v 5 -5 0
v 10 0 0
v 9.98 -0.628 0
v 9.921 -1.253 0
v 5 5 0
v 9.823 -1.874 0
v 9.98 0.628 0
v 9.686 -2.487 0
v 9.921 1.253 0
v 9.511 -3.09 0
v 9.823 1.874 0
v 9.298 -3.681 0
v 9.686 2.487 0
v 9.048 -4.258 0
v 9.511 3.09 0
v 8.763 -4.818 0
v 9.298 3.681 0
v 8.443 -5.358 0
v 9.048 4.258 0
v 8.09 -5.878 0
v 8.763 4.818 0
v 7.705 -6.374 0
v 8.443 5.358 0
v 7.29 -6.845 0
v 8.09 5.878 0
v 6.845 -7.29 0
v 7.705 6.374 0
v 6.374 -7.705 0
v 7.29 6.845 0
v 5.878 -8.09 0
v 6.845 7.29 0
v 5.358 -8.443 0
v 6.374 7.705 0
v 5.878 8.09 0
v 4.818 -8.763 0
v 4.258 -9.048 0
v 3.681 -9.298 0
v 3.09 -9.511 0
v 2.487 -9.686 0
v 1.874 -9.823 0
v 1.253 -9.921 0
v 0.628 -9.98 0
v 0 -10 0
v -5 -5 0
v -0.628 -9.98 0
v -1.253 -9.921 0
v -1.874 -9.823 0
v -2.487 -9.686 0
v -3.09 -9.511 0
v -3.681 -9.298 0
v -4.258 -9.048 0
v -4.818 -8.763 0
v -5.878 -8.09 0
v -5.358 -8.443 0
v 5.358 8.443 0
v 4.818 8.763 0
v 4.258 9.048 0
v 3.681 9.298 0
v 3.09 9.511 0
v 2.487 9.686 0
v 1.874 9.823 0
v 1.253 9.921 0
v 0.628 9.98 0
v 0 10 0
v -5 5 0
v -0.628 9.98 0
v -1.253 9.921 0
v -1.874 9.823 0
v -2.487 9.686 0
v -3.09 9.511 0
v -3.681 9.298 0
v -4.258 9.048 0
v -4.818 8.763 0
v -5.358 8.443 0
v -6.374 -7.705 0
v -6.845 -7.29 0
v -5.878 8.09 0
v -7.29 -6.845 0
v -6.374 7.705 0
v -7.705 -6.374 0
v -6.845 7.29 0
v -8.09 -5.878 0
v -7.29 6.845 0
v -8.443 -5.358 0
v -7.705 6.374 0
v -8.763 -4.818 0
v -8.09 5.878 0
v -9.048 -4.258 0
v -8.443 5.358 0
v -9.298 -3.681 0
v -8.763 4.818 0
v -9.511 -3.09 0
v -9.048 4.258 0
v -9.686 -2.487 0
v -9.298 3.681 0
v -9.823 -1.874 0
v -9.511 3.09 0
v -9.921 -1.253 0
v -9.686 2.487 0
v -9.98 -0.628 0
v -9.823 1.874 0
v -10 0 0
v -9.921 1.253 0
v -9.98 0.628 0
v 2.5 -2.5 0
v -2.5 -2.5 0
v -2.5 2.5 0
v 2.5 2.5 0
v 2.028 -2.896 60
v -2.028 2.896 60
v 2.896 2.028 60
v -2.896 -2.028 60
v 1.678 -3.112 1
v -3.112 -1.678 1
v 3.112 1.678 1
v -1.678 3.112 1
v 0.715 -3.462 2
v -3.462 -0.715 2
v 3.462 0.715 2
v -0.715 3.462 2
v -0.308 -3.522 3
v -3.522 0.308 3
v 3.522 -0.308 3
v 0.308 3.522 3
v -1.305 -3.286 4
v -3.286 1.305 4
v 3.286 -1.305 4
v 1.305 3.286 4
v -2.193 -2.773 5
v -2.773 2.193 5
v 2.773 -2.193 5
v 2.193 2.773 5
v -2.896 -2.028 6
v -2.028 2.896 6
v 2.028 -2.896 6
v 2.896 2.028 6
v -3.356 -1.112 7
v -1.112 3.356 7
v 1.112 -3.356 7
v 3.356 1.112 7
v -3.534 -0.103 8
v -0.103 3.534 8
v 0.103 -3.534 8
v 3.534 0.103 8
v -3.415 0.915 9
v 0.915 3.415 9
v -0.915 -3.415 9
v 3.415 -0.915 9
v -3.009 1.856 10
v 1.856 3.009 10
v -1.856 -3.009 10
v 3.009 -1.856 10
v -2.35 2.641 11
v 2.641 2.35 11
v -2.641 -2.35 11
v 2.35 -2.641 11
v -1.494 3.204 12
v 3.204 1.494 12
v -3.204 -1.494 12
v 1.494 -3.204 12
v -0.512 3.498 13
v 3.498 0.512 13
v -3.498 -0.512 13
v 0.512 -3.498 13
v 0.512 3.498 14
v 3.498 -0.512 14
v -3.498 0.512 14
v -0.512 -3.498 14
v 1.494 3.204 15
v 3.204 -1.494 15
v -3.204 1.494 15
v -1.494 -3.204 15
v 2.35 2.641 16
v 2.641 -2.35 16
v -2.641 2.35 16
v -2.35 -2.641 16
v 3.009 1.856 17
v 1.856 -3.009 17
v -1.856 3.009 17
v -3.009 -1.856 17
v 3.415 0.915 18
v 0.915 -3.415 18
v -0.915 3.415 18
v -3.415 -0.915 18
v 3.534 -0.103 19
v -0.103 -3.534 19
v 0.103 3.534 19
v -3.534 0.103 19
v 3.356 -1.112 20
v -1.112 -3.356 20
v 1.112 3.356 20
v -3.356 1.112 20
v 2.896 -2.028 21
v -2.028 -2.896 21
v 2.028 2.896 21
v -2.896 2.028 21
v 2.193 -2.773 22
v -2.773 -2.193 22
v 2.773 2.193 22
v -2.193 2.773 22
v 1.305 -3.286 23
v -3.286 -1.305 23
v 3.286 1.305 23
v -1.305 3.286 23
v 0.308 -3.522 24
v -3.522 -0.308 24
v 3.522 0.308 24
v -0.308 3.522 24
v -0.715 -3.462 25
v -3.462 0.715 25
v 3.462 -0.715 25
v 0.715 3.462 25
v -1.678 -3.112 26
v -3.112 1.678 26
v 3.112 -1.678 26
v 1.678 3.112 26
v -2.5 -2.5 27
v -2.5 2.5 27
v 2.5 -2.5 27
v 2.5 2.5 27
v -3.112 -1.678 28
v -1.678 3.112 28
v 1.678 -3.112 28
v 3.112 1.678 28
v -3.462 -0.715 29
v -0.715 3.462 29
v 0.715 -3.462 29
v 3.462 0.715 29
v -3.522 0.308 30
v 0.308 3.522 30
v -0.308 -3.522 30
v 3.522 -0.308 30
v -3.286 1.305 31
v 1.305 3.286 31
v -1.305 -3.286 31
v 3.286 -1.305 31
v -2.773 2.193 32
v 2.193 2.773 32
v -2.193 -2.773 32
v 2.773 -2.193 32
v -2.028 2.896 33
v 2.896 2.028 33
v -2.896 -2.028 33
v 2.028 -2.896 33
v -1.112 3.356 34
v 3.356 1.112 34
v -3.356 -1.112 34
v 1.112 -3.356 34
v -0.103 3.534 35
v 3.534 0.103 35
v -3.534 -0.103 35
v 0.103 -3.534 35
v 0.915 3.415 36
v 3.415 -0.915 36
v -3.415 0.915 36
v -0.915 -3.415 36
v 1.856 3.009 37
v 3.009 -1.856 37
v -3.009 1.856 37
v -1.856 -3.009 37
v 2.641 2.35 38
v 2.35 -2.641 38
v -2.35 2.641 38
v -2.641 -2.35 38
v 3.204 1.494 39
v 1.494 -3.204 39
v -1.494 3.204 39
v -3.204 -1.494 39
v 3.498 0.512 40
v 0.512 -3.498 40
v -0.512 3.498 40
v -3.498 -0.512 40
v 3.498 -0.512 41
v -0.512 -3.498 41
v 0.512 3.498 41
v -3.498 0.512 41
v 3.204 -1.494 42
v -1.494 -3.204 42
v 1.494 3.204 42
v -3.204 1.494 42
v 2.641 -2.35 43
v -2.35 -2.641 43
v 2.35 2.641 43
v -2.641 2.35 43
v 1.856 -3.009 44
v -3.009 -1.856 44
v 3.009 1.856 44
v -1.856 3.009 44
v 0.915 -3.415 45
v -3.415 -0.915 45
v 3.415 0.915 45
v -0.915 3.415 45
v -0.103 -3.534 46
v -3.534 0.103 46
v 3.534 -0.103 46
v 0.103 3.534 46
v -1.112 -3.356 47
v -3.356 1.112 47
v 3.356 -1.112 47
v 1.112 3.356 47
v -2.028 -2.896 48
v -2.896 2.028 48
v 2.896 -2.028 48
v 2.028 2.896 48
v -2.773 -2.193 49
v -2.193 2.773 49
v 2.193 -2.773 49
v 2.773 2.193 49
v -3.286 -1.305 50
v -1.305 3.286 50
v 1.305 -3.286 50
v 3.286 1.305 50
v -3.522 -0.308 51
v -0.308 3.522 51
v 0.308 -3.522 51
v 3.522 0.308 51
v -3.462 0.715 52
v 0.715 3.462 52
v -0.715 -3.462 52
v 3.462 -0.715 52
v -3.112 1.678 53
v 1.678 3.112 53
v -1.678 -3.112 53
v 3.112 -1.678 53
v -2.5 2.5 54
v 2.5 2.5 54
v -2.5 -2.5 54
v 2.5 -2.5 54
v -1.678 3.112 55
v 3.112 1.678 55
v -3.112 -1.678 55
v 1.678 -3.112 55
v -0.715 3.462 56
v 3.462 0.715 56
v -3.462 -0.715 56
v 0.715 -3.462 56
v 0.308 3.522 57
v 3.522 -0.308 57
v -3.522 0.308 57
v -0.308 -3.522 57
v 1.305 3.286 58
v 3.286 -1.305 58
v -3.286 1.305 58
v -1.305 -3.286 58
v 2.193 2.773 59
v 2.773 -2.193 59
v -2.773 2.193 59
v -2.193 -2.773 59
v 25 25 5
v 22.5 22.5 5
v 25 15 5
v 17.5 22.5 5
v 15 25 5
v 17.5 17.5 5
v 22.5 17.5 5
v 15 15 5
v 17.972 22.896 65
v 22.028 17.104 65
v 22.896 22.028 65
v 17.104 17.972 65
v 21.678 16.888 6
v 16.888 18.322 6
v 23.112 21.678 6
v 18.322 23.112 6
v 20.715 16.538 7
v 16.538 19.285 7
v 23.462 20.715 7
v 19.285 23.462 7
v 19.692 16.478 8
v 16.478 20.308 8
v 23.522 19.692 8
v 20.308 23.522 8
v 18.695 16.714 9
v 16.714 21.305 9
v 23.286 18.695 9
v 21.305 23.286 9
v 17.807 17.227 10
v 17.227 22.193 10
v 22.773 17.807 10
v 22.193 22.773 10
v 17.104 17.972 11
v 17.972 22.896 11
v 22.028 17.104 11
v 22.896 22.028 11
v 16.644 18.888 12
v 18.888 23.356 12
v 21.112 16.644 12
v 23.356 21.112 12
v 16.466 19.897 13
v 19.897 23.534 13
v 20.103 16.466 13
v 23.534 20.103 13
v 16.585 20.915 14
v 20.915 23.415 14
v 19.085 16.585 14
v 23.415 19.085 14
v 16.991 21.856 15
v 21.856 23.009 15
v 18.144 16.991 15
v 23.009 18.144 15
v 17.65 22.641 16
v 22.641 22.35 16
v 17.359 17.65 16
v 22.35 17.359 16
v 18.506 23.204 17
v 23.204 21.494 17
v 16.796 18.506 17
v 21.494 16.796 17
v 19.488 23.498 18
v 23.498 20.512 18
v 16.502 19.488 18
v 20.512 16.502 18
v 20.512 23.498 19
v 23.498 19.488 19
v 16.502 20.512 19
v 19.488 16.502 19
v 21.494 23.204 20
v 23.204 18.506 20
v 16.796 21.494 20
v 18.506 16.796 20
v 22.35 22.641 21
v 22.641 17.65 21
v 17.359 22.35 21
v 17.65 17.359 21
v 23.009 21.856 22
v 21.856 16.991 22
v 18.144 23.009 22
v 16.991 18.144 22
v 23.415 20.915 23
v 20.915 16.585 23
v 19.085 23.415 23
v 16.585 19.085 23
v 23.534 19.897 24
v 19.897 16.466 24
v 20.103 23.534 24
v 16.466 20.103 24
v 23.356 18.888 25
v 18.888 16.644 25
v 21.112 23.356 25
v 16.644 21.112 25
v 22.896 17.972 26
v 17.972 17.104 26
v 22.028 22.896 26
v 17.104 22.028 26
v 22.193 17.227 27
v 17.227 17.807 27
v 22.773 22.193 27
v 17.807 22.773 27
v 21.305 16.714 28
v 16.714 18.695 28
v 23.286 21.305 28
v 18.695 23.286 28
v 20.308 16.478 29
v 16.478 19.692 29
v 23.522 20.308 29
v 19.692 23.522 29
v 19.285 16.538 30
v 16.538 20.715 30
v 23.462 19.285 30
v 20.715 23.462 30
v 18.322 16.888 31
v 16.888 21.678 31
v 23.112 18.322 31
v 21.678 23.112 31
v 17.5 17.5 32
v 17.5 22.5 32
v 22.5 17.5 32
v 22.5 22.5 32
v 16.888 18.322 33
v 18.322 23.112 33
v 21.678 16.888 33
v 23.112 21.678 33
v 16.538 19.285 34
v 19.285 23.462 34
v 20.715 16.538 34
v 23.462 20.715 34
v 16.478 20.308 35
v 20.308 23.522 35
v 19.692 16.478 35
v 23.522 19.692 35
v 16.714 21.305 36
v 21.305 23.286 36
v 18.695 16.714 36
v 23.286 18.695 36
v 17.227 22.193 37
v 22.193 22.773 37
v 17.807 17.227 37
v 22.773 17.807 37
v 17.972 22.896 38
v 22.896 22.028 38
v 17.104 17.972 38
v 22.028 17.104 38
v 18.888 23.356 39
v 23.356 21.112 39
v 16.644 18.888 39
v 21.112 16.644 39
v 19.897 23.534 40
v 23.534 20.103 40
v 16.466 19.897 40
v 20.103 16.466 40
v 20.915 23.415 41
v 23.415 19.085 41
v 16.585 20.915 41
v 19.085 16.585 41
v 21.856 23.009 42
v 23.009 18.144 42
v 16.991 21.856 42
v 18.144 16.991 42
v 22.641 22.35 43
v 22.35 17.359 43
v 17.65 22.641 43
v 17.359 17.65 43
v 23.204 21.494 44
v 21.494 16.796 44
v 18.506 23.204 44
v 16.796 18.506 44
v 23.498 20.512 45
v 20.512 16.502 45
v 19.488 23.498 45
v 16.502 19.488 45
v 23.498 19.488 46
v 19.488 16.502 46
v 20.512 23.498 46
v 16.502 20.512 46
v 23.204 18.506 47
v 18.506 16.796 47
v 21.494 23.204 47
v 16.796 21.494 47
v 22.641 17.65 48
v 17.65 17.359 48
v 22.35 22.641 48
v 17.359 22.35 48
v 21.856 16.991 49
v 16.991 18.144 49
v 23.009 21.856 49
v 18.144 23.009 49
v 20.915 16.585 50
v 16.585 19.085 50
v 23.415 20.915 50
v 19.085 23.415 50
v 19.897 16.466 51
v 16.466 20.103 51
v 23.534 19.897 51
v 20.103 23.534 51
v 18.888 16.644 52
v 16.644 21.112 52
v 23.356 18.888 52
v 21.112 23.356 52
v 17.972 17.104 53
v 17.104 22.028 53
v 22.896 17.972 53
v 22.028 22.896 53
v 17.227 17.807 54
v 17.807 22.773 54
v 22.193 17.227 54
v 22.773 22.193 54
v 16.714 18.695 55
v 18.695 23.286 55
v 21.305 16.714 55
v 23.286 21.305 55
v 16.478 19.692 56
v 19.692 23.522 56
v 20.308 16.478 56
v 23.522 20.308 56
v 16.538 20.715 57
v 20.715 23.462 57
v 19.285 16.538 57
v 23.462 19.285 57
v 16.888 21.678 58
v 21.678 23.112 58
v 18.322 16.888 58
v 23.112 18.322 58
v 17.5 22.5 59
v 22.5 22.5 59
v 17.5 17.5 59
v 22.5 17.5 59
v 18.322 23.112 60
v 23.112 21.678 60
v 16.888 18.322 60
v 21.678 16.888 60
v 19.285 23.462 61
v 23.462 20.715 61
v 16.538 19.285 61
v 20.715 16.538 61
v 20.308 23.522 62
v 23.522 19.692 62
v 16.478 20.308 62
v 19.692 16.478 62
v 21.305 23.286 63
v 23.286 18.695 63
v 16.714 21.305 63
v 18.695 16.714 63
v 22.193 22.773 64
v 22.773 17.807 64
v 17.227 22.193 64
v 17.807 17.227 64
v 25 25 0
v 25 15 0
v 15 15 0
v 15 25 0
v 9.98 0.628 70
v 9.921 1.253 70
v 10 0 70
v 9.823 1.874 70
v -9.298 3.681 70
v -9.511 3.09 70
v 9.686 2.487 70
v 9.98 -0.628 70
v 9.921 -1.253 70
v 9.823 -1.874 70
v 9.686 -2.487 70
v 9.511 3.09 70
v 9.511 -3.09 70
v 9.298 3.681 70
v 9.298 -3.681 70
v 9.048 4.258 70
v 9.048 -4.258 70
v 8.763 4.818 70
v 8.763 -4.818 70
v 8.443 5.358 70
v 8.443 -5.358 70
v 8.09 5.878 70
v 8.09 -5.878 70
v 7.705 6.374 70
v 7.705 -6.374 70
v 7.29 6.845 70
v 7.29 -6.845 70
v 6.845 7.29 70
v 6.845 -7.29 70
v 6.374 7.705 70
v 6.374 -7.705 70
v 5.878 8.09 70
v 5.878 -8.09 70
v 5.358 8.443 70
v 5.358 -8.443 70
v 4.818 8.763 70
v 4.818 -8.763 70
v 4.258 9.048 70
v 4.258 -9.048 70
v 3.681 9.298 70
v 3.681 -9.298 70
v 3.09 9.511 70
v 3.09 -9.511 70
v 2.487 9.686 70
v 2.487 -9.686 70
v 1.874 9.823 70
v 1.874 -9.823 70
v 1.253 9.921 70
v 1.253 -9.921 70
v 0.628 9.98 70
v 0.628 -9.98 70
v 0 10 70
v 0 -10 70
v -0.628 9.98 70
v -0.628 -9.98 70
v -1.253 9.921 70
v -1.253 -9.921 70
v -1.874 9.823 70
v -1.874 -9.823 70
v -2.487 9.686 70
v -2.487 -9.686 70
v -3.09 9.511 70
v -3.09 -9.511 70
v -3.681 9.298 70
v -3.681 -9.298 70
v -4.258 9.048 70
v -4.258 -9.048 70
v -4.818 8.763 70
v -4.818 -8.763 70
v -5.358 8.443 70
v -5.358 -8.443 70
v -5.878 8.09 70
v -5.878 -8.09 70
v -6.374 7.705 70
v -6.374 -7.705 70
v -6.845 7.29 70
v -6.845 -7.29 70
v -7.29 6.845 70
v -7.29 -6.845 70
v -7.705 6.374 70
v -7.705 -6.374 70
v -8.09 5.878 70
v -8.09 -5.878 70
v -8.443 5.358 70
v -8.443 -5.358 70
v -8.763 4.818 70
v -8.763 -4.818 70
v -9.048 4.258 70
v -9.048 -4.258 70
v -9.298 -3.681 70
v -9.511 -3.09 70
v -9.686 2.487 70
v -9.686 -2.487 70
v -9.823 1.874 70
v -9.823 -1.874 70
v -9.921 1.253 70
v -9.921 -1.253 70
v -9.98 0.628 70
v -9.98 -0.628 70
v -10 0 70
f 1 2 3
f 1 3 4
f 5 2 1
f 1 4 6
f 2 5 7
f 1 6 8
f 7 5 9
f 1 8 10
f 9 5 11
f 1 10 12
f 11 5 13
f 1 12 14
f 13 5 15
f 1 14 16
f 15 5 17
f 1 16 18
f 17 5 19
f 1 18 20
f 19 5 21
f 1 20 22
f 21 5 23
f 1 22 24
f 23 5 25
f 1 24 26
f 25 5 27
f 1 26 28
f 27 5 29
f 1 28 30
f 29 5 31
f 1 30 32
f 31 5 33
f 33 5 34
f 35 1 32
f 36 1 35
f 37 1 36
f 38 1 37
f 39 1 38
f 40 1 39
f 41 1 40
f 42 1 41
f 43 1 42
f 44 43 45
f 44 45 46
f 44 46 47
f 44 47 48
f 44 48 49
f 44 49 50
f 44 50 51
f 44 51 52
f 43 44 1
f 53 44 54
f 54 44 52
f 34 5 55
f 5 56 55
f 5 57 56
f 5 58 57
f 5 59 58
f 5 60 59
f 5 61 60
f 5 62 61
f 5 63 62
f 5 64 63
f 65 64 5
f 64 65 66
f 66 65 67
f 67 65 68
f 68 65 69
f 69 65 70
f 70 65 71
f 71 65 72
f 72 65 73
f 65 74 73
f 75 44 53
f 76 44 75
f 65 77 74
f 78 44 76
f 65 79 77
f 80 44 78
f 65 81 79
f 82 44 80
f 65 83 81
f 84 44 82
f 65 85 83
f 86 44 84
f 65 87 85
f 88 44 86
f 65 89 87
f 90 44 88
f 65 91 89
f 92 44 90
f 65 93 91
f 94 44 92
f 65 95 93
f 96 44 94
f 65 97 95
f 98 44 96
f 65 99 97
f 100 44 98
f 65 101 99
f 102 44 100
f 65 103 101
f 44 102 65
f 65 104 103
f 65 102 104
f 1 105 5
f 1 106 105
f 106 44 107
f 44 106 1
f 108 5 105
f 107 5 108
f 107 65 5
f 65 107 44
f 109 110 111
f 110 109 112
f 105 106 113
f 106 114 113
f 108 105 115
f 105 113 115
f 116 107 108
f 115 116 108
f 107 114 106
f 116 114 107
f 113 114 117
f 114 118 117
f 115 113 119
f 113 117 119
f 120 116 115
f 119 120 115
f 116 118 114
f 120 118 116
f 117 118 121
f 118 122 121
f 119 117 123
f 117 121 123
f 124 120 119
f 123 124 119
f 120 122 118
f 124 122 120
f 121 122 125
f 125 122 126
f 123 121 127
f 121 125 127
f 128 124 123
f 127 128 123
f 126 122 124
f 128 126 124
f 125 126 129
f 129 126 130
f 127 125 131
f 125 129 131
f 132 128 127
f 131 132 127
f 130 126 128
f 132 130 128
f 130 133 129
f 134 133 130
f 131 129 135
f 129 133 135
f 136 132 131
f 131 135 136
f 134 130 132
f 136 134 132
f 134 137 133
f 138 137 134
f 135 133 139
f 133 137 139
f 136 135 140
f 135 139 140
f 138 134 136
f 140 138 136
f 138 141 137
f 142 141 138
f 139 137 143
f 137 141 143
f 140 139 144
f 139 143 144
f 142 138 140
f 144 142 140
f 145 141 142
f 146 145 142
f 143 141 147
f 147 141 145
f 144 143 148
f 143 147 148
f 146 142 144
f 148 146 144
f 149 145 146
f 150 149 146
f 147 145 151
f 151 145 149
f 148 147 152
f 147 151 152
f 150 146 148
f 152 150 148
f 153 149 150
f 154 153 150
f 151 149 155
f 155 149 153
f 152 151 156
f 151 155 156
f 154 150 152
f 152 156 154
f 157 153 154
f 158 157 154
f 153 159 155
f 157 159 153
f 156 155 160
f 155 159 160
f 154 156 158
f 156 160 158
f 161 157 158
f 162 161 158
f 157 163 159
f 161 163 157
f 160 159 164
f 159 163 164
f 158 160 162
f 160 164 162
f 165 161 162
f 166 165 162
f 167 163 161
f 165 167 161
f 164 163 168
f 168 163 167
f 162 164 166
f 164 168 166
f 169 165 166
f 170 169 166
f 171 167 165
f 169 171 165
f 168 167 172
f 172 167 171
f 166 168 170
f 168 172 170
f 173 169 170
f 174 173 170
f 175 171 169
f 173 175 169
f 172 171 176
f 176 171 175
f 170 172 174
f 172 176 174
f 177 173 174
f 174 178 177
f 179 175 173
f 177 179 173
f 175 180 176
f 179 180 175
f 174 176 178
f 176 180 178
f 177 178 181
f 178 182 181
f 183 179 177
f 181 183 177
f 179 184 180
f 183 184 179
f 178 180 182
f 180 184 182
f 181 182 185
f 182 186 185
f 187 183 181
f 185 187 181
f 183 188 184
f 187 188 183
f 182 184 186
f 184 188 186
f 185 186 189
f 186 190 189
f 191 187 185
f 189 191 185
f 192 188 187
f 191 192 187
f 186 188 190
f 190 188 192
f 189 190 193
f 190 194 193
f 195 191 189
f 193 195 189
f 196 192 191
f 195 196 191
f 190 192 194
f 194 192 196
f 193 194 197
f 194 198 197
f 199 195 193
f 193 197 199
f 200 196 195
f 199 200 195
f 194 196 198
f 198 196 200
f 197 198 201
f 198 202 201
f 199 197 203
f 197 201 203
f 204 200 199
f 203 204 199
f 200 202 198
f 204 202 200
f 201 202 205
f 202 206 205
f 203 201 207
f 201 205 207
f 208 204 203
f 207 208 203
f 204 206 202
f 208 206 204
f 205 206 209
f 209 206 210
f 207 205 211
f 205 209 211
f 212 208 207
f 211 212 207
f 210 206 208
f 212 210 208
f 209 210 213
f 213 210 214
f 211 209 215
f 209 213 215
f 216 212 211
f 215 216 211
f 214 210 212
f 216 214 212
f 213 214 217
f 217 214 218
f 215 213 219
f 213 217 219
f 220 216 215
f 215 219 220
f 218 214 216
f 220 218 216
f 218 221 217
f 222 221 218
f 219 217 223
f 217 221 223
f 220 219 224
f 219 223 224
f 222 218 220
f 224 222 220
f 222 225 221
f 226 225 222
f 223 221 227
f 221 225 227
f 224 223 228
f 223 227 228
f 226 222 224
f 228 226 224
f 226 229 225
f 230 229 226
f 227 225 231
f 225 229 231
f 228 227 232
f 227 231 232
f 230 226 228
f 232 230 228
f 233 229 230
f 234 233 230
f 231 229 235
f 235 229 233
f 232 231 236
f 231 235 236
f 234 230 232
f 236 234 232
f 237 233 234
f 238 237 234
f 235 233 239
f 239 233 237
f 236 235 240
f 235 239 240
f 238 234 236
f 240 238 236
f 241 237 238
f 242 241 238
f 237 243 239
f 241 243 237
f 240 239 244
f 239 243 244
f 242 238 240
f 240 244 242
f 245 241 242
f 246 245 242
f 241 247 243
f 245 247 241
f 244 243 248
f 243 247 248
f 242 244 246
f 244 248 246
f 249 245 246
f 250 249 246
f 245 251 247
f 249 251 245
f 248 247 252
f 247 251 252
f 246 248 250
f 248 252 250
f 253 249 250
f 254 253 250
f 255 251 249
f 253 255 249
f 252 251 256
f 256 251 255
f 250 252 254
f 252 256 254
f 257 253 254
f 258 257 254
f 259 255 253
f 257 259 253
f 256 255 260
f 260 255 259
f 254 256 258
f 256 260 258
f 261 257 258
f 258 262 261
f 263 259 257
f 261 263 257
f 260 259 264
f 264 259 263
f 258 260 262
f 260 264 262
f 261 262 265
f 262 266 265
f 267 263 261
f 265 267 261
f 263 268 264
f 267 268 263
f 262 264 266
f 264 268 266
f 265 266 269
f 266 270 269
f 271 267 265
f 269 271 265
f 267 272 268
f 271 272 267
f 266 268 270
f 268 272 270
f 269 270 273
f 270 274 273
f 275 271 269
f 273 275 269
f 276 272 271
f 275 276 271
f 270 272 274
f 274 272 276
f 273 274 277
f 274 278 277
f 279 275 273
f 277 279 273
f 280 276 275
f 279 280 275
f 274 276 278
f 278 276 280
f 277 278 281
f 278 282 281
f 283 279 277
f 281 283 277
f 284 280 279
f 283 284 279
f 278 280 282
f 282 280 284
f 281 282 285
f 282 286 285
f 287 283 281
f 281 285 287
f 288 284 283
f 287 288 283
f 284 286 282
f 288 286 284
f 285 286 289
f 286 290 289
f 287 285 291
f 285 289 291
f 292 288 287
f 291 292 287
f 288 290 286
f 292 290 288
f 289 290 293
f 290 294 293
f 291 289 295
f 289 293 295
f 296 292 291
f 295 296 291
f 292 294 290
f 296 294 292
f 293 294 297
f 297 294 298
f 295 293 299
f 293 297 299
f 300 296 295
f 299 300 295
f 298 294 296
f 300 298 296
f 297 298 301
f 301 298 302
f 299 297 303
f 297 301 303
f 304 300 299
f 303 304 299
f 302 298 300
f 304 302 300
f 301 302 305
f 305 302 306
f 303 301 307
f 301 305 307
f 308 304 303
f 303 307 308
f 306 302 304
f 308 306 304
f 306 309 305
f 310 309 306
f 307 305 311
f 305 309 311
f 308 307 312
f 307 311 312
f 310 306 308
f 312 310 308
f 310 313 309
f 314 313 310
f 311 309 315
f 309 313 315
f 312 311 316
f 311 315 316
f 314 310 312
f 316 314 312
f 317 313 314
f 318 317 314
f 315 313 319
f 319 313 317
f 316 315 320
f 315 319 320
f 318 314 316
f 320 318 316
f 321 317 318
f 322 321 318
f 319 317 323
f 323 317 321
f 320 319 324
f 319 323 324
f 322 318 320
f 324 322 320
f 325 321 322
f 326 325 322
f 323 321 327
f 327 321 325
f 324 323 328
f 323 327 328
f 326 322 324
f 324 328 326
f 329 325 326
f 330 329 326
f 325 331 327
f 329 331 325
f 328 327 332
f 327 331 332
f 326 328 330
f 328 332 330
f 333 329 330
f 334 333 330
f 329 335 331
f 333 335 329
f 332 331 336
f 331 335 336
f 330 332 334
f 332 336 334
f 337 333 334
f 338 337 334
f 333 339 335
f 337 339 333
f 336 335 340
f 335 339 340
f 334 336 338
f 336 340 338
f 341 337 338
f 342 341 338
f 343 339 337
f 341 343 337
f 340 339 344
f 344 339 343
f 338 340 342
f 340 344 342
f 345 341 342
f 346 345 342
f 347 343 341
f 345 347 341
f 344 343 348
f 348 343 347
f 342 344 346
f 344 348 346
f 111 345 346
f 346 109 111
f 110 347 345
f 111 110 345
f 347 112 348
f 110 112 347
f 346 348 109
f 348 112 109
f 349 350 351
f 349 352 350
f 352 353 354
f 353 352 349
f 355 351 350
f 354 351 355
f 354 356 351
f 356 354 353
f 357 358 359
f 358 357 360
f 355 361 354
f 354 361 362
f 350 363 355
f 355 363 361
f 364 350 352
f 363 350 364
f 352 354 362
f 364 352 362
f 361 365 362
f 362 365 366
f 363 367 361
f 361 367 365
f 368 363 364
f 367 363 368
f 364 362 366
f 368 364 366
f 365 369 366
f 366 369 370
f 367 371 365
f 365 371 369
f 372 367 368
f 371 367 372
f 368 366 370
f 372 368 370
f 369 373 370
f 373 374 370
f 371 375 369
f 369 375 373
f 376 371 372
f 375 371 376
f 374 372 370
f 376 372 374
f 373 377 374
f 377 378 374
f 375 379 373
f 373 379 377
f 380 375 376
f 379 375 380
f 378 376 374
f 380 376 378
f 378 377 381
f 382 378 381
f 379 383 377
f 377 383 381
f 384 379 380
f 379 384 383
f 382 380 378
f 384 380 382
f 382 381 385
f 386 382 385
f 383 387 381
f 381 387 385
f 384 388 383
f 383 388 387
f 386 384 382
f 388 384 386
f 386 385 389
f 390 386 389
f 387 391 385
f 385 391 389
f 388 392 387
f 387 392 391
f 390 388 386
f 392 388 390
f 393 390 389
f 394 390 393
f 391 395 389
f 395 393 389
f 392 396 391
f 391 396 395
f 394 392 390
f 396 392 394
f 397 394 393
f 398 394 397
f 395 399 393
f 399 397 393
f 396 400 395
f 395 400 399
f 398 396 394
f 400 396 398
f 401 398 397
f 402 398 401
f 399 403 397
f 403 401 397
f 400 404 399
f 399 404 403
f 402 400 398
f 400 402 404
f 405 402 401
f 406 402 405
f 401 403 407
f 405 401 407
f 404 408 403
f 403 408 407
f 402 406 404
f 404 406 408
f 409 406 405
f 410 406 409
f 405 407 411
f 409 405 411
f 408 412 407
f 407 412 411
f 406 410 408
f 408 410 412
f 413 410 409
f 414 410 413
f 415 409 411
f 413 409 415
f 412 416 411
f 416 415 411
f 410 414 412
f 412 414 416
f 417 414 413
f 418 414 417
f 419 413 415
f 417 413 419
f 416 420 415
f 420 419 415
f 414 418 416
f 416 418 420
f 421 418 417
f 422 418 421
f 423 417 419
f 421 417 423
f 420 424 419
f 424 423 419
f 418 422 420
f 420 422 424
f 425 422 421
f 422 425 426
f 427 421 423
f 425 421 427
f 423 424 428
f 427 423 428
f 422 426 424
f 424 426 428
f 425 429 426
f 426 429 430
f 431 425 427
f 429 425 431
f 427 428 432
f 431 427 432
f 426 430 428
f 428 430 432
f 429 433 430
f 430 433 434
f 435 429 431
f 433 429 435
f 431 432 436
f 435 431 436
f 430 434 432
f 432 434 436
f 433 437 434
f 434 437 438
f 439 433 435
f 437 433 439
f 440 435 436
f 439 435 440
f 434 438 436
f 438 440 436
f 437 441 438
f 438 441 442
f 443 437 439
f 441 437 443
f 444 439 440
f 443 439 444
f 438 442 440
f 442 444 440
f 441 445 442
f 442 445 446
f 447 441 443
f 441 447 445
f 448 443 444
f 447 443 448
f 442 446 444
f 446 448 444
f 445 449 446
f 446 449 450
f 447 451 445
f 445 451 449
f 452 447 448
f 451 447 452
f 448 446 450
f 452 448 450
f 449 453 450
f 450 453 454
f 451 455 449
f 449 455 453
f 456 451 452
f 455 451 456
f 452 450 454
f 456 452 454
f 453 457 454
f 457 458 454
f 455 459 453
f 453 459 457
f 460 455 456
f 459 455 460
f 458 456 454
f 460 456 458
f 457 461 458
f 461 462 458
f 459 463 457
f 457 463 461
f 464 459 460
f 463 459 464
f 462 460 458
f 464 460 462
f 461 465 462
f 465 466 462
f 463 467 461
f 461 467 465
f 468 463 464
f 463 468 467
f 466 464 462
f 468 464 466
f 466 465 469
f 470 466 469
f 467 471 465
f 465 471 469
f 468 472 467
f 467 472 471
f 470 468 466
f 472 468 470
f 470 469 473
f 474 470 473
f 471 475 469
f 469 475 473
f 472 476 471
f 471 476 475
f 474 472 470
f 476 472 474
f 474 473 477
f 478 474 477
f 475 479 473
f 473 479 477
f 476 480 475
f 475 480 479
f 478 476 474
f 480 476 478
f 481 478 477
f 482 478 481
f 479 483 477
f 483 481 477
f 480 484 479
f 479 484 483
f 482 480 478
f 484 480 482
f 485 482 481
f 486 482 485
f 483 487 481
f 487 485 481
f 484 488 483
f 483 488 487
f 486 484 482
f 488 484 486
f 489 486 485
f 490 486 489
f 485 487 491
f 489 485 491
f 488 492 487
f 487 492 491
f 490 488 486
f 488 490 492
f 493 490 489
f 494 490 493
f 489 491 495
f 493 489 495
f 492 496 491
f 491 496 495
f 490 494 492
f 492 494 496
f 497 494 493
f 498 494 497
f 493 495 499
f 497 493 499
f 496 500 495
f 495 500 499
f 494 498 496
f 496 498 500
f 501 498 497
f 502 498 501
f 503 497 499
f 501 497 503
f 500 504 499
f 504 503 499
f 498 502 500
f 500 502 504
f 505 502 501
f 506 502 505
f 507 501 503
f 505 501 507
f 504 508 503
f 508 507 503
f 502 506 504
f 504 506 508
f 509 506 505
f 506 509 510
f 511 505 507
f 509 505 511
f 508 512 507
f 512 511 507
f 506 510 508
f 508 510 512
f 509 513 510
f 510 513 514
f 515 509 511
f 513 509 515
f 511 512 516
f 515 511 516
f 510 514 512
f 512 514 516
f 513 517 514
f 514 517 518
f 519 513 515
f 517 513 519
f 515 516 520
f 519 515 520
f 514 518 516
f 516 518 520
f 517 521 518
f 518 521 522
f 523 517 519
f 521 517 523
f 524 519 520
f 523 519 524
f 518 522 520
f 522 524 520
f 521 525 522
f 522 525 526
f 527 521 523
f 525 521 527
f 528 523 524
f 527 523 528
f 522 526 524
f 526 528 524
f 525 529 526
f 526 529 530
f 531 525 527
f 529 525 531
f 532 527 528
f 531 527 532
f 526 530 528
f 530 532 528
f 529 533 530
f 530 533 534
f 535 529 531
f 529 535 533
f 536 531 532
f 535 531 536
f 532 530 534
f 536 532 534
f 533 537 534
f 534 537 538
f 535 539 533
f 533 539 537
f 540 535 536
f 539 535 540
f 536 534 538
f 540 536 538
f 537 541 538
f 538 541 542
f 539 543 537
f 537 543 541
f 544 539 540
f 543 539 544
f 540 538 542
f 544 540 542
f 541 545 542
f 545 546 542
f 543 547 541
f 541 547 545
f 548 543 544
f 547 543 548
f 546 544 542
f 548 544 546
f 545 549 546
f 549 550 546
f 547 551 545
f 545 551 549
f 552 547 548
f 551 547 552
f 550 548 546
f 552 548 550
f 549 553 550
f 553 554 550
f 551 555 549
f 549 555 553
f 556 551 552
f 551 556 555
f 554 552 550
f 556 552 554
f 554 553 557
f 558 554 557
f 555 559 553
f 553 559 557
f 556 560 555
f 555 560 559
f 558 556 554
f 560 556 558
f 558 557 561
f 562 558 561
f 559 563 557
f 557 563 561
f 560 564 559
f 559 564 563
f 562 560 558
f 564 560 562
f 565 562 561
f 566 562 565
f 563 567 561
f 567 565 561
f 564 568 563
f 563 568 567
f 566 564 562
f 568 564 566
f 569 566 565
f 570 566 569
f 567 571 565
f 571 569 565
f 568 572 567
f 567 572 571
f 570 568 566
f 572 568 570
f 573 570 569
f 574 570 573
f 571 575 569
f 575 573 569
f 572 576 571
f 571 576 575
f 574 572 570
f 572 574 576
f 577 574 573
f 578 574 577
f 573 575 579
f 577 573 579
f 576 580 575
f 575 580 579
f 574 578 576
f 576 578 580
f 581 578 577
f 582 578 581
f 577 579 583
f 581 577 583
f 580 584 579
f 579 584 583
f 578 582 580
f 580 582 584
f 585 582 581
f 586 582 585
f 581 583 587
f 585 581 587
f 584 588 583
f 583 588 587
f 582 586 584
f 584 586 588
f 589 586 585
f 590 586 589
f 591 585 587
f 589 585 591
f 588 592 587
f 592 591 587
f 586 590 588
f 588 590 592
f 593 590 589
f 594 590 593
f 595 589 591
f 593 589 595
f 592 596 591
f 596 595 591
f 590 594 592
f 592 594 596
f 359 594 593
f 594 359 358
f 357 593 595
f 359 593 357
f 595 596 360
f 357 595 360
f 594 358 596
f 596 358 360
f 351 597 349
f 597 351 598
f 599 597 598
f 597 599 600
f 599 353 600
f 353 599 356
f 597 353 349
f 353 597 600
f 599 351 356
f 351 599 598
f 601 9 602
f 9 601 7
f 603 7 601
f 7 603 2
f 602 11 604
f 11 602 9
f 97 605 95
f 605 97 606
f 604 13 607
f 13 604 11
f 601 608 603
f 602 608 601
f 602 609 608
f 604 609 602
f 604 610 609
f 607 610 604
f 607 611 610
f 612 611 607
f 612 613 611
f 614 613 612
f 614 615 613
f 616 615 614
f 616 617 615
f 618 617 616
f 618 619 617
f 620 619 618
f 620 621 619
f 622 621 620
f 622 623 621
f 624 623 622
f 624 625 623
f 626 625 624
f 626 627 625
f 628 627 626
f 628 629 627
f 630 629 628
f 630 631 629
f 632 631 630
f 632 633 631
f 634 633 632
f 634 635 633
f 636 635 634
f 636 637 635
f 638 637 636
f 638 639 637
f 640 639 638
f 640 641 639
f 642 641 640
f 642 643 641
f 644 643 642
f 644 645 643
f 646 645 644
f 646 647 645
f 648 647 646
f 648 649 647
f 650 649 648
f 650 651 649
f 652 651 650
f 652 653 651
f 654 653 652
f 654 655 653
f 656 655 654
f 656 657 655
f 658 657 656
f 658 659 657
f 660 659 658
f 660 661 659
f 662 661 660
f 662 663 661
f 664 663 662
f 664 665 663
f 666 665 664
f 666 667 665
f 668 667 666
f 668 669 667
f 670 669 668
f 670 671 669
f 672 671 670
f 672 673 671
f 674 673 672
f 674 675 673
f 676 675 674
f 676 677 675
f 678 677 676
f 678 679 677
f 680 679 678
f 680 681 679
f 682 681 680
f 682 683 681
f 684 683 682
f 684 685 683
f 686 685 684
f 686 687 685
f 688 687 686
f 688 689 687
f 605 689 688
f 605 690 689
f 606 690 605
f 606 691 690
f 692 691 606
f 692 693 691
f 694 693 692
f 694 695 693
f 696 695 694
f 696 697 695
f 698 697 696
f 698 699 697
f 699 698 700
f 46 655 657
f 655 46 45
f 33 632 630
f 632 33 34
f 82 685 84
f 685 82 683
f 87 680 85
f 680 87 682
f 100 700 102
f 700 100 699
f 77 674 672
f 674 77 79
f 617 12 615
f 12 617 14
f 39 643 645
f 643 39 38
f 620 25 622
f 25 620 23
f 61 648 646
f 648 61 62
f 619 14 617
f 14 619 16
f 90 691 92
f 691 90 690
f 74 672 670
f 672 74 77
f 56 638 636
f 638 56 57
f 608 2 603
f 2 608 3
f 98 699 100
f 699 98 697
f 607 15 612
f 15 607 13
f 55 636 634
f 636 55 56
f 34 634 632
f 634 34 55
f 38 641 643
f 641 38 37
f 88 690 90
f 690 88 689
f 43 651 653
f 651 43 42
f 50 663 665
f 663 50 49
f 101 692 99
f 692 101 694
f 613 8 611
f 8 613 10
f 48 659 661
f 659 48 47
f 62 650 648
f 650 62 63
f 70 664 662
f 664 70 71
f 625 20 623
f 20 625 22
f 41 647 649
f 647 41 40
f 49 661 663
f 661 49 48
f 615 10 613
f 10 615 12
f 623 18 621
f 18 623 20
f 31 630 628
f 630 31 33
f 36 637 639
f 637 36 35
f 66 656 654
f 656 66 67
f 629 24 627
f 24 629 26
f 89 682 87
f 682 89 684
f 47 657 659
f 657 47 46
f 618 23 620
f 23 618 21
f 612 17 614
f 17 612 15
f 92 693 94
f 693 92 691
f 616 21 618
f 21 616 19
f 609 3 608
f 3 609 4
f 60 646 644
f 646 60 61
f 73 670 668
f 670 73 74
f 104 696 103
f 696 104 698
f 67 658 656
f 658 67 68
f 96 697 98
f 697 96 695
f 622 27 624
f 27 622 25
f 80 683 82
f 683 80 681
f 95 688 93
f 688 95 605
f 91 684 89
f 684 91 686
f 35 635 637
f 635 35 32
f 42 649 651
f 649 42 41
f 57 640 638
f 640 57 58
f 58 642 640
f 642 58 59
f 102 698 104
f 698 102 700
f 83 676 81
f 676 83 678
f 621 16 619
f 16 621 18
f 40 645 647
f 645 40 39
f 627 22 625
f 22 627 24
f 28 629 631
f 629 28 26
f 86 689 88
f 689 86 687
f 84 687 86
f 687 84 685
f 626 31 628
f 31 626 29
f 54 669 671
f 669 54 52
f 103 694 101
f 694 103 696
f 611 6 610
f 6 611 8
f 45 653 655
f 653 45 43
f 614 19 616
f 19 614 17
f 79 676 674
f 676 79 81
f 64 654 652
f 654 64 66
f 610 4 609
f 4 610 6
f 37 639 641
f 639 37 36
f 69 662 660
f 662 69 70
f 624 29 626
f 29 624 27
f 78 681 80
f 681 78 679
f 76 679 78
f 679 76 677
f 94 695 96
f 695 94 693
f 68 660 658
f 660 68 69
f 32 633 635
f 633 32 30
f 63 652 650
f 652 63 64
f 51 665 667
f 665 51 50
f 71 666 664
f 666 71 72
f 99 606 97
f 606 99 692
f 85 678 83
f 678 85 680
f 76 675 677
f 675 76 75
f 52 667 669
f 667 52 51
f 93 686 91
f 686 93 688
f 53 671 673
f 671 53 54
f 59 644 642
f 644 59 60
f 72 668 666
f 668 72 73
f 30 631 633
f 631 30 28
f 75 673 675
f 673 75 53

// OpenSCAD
module ding(){
    
linear_extrude(height = 60, twist = 1000, slices = 60) {
    square(5, center = true);
     
 }
 translate([0,0,-2.5])
 cube([10,10,5],center=true);
 }
 
 module ti(){
     difference(){
         cylinder(r=10,h=70,$fn=100);
         ding();
     }
 }
 translate([20,20,5])
 ding();
 
 ti();
